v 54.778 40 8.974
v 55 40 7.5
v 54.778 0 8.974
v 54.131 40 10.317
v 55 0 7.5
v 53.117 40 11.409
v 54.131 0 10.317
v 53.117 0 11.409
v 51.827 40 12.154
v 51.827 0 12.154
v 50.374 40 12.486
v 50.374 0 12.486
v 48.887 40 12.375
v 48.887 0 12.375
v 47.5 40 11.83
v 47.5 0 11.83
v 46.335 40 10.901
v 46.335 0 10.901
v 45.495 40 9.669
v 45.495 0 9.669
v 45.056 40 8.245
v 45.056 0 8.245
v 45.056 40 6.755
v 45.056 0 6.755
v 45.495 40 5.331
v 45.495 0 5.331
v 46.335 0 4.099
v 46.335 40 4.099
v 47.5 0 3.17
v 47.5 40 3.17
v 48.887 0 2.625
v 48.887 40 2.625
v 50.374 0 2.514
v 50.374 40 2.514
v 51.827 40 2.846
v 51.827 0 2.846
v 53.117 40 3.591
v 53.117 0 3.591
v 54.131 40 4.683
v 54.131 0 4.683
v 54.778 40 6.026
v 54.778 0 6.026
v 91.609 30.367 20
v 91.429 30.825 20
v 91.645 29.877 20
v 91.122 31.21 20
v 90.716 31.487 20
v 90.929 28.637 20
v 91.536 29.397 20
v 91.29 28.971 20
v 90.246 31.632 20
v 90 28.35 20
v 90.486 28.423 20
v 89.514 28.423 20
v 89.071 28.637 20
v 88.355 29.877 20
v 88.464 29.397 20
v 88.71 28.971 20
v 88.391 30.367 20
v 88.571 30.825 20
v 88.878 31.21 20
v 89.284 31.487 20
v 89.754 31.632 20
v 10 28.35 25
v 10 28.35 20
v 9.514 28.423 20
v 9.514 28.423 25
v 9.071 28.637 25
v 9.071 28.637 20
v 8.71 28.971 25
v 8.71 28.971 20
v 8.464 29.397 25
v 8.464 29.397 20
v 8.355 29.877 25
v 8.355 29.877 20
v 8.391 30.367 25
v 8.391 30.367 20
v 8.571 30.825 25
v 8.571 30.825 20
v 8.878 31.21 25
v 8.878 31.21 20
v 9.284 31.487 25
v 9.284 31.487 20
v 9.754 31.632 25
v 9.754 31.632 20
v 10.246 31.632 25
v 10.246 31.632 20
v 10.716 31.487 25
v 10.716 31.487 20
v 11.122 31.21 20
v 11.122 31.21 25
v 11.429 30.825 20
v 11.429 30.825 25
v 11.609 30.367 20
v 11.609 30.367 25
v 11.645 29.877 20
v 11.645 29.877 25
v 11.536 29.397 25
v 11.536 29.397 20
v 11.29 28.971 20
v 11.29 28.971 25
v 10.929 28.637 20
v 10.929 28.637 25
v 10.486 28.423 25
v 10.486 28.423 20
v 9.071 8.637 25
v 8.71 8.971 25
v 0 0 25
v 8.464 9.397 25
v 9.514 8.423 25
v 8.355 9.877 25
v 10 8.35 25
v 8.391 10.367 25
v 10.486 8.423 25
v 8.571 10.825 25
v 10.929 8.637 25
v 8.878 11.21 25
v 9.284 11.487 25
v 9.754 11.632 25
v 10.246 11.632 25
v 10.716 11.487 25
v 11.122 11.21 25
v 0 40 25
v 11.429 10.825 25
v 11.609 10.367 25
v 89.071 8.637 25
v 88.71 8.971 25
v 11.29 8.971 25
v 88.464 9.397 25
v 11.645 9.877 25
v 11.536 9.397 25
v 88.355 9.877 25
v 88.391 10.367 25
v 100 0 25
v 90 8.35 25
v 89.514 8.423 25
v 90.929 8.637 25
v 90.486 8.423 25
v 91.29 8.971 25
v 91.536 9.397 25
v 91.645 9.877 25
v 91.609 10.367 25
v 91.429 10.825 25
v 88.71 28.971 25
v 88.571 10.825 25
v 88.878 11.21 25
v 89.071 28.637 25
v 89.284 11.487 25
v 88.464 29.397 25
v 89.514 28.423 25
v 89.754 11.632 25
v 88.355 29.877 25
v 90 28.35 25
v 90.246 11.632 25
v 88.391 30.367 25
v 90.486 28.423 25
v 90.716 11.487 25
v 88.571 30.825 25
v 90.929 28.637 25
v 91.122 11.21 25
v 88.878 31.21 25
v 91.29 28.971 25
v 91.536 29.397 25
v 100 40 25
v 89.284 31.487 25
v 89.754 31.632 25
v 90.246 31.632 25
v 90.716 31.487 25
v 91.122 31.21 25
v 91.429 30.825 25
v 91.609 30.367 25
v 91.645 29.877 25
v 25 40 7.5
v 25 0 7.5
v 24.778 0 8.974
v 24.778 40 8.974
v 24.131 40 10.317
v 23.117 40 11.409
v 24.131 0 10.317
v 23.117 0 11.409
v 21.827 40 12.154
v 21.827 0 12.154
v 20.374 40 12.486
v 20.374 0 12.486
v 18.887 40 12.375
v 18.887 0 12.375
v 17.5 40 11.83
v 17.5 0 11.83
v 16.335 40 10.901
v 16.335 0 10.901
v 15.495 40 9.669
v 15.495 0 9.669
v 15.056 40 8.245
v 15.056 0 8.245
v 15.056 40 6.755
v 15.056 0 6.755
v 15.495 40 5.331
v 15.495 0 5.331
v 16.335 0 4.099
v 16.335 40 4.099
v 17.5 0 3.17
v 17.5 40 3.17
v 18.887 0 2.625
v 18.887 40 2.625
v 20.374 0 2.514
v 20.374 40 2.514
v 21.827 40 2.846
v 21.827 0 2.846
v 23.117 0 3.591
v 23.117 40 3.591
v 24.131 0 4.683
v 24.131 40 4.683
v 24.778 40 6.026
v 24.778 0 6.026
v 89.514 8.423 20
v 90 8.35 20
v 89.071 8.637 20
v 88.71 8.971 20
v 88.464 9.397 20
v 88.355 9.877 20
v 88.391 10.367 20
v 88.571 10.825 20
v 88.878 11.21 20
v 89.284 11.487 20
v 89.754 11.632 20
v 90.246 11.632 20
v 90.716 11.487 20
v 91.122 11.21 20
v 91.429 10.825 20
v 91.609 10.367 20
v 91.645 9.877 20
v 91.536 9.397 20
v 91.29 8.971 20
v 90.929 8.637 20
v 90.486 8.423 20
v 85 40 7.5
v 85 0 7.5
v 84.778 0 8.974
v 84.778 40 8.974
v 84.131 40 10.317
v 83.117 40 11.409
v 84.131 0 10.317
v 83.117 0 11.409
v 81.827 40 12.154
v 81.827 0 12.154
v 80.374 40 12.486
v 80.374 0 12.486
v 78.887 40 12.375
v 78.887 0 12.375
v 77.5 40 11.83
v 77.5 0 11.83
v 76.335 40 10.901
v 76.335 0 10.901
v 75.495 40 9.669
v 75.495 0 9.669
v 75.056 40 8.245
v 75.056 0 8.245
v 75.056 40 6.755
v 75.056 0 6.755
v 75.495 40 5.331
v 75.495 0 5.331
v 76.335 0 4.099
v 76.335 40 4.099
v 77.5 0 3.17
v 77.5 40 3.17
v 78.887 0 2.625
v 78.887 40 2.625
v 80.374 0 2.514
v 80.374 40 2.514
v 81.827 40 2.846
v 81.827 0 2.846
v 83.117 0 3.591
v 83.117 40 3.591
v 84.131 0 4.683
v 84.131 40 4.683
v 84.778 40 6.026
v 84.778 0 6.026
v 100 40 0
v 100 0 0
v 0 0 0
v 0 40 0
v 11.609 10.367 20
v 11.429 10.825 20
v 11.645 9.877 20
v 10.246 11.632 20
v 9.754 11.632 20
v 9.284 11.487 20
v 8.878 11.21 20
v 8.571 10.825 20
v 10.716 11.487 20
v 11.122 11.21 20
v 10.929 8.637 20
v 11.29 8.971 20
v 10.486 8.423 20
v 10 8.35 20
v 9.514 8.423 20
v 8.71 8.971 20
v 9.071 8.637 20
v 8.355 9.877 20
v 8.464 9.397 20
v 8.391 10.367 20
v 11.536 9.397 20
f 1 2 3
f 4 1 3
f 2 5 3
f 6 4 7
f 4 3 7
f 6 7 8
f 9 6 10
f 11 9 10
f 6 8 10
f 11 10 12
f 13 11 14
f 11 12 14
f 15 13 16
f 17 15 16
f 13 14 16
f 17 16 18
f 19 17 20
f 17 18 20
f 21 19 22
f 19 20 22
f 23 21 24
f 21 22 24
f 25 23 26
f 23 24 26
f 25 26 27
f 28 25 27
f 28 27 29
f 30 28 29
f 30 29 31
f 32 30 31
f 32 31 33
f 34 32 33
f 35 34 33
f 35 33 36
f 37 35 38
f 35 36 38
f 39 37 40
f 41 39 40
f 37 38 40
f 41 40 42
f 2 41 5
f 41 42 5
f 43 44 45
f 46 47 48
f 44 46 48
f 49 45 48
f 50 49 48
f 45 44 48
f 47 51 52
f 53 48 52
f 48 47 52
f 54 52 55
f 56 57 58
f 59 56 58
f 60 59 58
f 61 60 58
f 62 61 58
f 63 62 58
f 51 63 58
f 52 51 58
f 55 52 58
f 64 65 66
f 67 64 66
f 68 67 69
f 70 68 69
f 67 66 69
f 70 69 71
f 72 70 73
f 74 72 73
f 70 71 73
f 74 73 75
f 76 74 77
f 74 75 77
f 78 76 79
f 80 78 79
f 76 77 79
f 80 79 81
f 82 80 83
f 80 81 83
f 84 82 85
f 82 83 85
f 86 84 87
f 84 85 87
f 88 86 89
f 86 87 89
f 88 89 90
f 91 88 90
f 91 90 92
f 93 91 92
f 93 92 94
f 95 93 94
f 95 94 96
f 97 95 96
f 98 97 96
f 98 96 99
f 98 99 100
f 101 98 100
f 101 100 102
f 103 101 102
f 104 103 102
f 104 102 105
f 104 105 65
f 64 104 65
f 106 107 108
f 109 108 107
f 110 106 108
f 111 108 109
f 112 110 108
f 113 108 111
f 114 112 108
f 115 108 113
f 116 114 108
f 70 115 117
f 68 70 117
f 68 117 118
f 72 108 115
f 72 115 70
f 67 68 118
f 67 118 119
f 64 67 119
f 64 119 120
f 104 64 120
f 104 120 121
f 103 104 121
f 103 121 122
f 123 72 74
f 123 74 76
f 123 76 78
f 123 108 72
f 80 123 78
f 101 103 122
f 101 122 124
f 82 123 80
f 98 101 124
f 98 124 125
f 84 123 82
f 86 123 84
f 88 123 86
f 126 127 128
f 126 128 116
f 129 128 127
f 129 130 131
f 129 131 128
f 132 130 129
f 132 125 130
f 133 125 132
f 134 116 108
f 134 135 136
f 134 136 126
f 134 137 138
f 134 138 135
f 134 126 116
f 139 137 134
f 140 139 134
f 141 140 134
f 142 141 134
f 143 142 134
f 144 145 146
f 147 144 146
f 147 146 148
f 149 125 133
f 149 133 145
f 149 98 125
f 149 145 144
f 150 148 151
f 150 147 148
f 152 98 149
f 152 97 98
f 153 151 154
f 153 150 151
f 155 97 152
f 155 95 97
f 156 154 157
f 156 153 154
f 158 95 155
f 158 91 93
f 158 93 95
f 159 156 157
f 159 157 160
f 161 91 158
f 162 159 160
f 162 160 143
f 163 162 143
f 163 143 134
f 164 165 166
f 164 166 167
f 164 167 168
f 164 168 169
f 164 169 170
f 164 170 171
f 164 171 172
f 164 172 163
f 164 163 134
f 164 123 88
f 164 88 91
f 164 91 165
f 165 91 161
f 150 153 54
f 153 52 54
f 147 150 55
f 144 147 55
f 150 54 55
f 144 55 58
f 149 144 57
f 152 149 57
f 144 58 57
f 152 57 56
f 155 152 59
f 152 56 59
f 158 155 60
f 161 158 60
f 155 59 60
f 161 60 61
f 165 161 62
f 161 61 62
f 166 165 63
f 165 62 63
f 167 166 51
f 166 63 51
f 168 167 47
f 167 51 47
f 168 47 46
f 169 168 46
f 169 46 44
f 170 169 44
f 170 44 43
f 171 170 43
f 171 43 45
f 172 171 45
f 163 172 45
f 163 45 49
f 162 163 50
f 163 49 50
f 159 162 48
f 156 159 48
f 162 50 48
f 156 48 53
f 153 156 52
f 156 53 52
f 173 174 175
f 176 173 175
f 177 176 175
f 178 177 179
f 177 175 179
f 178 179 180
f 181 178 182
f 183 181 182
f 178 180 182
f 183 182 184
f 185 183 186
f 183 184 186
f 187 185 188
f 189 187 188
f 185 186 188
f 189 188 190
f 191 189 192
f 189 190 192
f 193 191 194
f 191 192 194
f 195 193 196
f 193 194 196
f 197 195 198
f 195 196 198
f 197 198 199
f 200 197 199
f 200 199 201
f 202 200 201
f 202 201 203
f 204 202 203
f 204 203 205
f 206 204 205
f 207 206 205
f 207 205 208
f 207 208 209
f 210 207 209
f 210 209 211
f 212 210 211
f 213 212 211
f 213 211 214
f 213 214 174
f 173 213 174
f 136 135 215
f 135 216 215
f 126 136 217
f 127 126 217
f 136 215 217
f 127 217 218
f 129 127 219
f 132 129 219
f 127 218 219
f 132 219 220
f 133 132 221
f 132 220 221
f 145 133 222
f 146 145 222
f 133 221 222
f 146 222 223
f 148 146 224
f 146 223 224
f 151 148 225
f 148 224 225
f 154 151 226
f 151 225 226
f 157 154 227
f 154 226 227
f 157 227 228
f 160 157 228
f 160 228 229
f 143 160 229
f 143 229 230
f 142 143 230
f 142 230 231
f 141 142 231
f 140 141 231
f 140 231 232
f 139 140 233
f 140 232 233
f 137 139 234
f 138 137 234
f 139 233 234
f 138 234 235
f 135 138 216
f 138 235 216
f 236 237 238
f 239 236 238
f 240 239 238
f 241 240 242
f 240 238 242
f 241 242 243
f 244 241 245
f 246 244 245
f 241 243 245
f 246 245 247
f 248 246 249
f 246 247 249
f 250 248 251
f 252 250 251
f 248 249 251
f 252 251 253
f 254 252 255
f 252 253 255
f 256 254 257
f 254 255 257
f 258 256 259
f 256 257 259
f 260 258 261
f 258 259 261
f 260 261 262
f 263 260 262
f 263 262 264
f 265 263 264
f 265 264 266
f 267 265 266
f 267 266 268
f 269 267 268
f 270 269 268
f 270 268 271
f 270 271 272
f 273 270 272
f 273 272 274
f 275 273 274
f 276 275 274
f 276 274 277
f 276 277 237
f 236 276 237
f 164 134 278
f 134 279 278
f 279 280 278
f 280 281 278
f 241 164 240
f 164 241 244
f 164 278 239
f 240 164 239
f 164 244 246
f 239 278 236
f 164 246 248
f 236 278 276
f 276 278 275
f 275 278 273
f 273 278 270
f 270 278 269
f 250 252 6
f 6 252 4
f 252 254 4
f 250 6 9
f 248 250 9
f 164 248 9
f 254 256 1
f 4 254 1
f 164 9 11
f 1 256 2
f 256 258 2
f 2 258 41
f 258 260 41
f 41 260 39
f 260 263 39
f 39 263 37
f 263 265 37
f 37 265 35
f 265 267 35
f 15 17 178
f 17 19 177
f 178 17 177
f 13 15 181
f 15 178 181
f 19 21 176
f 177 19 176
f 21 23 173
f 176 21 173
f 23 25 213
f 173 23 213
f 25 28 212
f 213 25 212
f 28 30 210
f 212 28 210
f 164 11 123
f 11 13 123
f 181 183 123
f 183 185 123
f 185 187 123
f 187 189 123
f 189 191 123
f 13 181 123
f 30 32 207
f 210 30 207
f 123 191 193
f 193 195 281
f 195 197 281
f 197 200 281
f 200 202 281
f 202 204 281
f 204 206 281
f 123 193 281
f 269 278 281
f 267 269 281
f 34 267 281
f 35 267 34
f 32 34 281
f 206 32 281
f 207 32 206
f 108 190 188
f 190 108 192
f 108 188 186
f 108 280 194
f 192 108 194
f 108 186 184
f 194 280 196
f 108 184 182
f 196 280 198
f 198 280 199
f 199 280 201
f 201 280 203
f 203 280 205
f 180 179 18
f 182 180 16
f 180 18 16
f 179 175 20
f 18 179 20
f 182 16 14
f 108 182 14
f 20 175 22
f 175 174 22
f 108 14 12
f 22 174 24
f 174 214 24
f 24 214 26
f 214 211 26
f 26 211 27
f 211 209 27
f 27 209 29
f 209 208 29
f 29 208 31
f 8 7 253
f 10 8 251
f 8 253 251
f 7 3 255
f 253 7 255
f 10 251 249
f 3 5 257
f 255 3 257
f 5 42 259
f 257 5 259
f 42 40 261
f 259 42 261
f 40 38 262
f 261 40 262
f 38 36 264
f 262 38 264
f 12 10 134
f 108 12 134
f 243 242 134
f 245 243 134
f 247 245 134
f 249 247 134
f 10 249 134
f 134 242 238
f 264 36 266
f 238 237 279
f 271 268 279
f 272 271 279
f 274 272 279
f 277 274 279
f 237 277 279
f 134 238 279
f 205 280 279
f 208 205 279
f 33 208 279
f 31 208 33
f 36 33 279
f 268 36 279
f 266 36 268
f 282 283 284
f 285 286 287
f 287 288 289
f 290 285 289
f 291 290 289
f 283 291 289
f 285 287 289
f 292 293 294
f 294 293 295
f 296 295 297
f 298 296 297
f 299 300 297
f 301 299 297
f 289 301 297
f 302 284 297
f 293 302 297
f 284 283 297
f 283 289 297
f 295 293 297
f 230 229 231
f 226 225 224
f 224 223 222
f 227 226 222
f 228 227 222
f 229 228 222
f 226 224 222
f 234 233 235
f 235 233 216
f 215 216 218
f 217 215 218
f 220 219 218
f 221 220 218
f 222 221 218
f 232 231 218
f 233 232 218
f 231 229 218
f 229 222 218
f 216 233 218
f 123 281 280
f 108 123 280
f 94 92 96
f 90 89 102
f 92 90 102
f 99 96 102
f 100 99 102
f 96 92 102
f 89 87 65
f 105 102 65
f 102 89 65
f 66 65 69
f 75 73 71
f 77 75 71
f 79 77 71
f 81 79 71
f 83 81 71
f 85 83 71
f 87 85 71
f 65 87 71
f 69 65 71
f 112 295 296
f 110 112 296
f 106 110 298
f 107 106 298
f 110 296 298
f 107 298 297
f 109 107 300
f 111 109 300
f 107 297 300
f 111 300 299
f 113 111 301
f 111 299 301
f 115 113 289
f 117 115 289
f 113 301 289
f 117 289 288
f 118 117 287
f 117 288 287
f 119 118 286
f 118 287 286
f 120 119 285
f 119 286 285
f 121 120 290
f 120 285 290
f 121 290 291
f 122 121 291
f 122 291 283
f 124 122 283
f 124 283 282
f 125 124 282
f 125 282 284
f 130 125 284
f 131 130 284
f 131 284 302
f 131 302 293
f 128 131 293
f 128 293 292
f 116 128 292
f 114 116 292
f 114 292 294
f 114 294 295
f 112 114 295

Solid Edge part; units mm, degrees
sketch "Sketch1" plane through (0, 0, 0) normal (0, 0, 1) x (1, 0, 0)
  line L0 (100, 0) -> (100, 40)
  line L1 (100, 40) -> (0, 40)
  line L2 (0, 40) -> (0, 0)
  line L3 (0, 0) -> (100, 0)
extrude "Protrusion1" add sketch "Sketch1" along normal blind 25
sketch "Sketch2" plane through (50, 0, 17.5) normal (0, -1, 0) x (1, 0, 0)
  circle A0 centre (-30, -10) radius 5
  circle A1 centre (0, -10) radius 5
  circle A2 centre (30, -10) radius 5
  dimension "D1" = 20
  dimension "D2" = 7.5
  dimension "D3" = 30
  dimension "D4" = 30
extrude "Cutout1" cut sketch "Sketch2" against normal up to next
hole "Hole_1" at (10, 10, 25) direction (0, 0, -1) diameter 3.3 depth 5
hole "Hole1" at (90, 10, 25) direction (0, 0, -1) diameter 3.3 depth 5
hole "Hole2" at (90, 30, 25) direction (0, 0, -1) diameter 3.3 depth 5
hole "Hole3" at (10, 30, 25) direction (0, 0, -1) diameter 3.3 depth 5
